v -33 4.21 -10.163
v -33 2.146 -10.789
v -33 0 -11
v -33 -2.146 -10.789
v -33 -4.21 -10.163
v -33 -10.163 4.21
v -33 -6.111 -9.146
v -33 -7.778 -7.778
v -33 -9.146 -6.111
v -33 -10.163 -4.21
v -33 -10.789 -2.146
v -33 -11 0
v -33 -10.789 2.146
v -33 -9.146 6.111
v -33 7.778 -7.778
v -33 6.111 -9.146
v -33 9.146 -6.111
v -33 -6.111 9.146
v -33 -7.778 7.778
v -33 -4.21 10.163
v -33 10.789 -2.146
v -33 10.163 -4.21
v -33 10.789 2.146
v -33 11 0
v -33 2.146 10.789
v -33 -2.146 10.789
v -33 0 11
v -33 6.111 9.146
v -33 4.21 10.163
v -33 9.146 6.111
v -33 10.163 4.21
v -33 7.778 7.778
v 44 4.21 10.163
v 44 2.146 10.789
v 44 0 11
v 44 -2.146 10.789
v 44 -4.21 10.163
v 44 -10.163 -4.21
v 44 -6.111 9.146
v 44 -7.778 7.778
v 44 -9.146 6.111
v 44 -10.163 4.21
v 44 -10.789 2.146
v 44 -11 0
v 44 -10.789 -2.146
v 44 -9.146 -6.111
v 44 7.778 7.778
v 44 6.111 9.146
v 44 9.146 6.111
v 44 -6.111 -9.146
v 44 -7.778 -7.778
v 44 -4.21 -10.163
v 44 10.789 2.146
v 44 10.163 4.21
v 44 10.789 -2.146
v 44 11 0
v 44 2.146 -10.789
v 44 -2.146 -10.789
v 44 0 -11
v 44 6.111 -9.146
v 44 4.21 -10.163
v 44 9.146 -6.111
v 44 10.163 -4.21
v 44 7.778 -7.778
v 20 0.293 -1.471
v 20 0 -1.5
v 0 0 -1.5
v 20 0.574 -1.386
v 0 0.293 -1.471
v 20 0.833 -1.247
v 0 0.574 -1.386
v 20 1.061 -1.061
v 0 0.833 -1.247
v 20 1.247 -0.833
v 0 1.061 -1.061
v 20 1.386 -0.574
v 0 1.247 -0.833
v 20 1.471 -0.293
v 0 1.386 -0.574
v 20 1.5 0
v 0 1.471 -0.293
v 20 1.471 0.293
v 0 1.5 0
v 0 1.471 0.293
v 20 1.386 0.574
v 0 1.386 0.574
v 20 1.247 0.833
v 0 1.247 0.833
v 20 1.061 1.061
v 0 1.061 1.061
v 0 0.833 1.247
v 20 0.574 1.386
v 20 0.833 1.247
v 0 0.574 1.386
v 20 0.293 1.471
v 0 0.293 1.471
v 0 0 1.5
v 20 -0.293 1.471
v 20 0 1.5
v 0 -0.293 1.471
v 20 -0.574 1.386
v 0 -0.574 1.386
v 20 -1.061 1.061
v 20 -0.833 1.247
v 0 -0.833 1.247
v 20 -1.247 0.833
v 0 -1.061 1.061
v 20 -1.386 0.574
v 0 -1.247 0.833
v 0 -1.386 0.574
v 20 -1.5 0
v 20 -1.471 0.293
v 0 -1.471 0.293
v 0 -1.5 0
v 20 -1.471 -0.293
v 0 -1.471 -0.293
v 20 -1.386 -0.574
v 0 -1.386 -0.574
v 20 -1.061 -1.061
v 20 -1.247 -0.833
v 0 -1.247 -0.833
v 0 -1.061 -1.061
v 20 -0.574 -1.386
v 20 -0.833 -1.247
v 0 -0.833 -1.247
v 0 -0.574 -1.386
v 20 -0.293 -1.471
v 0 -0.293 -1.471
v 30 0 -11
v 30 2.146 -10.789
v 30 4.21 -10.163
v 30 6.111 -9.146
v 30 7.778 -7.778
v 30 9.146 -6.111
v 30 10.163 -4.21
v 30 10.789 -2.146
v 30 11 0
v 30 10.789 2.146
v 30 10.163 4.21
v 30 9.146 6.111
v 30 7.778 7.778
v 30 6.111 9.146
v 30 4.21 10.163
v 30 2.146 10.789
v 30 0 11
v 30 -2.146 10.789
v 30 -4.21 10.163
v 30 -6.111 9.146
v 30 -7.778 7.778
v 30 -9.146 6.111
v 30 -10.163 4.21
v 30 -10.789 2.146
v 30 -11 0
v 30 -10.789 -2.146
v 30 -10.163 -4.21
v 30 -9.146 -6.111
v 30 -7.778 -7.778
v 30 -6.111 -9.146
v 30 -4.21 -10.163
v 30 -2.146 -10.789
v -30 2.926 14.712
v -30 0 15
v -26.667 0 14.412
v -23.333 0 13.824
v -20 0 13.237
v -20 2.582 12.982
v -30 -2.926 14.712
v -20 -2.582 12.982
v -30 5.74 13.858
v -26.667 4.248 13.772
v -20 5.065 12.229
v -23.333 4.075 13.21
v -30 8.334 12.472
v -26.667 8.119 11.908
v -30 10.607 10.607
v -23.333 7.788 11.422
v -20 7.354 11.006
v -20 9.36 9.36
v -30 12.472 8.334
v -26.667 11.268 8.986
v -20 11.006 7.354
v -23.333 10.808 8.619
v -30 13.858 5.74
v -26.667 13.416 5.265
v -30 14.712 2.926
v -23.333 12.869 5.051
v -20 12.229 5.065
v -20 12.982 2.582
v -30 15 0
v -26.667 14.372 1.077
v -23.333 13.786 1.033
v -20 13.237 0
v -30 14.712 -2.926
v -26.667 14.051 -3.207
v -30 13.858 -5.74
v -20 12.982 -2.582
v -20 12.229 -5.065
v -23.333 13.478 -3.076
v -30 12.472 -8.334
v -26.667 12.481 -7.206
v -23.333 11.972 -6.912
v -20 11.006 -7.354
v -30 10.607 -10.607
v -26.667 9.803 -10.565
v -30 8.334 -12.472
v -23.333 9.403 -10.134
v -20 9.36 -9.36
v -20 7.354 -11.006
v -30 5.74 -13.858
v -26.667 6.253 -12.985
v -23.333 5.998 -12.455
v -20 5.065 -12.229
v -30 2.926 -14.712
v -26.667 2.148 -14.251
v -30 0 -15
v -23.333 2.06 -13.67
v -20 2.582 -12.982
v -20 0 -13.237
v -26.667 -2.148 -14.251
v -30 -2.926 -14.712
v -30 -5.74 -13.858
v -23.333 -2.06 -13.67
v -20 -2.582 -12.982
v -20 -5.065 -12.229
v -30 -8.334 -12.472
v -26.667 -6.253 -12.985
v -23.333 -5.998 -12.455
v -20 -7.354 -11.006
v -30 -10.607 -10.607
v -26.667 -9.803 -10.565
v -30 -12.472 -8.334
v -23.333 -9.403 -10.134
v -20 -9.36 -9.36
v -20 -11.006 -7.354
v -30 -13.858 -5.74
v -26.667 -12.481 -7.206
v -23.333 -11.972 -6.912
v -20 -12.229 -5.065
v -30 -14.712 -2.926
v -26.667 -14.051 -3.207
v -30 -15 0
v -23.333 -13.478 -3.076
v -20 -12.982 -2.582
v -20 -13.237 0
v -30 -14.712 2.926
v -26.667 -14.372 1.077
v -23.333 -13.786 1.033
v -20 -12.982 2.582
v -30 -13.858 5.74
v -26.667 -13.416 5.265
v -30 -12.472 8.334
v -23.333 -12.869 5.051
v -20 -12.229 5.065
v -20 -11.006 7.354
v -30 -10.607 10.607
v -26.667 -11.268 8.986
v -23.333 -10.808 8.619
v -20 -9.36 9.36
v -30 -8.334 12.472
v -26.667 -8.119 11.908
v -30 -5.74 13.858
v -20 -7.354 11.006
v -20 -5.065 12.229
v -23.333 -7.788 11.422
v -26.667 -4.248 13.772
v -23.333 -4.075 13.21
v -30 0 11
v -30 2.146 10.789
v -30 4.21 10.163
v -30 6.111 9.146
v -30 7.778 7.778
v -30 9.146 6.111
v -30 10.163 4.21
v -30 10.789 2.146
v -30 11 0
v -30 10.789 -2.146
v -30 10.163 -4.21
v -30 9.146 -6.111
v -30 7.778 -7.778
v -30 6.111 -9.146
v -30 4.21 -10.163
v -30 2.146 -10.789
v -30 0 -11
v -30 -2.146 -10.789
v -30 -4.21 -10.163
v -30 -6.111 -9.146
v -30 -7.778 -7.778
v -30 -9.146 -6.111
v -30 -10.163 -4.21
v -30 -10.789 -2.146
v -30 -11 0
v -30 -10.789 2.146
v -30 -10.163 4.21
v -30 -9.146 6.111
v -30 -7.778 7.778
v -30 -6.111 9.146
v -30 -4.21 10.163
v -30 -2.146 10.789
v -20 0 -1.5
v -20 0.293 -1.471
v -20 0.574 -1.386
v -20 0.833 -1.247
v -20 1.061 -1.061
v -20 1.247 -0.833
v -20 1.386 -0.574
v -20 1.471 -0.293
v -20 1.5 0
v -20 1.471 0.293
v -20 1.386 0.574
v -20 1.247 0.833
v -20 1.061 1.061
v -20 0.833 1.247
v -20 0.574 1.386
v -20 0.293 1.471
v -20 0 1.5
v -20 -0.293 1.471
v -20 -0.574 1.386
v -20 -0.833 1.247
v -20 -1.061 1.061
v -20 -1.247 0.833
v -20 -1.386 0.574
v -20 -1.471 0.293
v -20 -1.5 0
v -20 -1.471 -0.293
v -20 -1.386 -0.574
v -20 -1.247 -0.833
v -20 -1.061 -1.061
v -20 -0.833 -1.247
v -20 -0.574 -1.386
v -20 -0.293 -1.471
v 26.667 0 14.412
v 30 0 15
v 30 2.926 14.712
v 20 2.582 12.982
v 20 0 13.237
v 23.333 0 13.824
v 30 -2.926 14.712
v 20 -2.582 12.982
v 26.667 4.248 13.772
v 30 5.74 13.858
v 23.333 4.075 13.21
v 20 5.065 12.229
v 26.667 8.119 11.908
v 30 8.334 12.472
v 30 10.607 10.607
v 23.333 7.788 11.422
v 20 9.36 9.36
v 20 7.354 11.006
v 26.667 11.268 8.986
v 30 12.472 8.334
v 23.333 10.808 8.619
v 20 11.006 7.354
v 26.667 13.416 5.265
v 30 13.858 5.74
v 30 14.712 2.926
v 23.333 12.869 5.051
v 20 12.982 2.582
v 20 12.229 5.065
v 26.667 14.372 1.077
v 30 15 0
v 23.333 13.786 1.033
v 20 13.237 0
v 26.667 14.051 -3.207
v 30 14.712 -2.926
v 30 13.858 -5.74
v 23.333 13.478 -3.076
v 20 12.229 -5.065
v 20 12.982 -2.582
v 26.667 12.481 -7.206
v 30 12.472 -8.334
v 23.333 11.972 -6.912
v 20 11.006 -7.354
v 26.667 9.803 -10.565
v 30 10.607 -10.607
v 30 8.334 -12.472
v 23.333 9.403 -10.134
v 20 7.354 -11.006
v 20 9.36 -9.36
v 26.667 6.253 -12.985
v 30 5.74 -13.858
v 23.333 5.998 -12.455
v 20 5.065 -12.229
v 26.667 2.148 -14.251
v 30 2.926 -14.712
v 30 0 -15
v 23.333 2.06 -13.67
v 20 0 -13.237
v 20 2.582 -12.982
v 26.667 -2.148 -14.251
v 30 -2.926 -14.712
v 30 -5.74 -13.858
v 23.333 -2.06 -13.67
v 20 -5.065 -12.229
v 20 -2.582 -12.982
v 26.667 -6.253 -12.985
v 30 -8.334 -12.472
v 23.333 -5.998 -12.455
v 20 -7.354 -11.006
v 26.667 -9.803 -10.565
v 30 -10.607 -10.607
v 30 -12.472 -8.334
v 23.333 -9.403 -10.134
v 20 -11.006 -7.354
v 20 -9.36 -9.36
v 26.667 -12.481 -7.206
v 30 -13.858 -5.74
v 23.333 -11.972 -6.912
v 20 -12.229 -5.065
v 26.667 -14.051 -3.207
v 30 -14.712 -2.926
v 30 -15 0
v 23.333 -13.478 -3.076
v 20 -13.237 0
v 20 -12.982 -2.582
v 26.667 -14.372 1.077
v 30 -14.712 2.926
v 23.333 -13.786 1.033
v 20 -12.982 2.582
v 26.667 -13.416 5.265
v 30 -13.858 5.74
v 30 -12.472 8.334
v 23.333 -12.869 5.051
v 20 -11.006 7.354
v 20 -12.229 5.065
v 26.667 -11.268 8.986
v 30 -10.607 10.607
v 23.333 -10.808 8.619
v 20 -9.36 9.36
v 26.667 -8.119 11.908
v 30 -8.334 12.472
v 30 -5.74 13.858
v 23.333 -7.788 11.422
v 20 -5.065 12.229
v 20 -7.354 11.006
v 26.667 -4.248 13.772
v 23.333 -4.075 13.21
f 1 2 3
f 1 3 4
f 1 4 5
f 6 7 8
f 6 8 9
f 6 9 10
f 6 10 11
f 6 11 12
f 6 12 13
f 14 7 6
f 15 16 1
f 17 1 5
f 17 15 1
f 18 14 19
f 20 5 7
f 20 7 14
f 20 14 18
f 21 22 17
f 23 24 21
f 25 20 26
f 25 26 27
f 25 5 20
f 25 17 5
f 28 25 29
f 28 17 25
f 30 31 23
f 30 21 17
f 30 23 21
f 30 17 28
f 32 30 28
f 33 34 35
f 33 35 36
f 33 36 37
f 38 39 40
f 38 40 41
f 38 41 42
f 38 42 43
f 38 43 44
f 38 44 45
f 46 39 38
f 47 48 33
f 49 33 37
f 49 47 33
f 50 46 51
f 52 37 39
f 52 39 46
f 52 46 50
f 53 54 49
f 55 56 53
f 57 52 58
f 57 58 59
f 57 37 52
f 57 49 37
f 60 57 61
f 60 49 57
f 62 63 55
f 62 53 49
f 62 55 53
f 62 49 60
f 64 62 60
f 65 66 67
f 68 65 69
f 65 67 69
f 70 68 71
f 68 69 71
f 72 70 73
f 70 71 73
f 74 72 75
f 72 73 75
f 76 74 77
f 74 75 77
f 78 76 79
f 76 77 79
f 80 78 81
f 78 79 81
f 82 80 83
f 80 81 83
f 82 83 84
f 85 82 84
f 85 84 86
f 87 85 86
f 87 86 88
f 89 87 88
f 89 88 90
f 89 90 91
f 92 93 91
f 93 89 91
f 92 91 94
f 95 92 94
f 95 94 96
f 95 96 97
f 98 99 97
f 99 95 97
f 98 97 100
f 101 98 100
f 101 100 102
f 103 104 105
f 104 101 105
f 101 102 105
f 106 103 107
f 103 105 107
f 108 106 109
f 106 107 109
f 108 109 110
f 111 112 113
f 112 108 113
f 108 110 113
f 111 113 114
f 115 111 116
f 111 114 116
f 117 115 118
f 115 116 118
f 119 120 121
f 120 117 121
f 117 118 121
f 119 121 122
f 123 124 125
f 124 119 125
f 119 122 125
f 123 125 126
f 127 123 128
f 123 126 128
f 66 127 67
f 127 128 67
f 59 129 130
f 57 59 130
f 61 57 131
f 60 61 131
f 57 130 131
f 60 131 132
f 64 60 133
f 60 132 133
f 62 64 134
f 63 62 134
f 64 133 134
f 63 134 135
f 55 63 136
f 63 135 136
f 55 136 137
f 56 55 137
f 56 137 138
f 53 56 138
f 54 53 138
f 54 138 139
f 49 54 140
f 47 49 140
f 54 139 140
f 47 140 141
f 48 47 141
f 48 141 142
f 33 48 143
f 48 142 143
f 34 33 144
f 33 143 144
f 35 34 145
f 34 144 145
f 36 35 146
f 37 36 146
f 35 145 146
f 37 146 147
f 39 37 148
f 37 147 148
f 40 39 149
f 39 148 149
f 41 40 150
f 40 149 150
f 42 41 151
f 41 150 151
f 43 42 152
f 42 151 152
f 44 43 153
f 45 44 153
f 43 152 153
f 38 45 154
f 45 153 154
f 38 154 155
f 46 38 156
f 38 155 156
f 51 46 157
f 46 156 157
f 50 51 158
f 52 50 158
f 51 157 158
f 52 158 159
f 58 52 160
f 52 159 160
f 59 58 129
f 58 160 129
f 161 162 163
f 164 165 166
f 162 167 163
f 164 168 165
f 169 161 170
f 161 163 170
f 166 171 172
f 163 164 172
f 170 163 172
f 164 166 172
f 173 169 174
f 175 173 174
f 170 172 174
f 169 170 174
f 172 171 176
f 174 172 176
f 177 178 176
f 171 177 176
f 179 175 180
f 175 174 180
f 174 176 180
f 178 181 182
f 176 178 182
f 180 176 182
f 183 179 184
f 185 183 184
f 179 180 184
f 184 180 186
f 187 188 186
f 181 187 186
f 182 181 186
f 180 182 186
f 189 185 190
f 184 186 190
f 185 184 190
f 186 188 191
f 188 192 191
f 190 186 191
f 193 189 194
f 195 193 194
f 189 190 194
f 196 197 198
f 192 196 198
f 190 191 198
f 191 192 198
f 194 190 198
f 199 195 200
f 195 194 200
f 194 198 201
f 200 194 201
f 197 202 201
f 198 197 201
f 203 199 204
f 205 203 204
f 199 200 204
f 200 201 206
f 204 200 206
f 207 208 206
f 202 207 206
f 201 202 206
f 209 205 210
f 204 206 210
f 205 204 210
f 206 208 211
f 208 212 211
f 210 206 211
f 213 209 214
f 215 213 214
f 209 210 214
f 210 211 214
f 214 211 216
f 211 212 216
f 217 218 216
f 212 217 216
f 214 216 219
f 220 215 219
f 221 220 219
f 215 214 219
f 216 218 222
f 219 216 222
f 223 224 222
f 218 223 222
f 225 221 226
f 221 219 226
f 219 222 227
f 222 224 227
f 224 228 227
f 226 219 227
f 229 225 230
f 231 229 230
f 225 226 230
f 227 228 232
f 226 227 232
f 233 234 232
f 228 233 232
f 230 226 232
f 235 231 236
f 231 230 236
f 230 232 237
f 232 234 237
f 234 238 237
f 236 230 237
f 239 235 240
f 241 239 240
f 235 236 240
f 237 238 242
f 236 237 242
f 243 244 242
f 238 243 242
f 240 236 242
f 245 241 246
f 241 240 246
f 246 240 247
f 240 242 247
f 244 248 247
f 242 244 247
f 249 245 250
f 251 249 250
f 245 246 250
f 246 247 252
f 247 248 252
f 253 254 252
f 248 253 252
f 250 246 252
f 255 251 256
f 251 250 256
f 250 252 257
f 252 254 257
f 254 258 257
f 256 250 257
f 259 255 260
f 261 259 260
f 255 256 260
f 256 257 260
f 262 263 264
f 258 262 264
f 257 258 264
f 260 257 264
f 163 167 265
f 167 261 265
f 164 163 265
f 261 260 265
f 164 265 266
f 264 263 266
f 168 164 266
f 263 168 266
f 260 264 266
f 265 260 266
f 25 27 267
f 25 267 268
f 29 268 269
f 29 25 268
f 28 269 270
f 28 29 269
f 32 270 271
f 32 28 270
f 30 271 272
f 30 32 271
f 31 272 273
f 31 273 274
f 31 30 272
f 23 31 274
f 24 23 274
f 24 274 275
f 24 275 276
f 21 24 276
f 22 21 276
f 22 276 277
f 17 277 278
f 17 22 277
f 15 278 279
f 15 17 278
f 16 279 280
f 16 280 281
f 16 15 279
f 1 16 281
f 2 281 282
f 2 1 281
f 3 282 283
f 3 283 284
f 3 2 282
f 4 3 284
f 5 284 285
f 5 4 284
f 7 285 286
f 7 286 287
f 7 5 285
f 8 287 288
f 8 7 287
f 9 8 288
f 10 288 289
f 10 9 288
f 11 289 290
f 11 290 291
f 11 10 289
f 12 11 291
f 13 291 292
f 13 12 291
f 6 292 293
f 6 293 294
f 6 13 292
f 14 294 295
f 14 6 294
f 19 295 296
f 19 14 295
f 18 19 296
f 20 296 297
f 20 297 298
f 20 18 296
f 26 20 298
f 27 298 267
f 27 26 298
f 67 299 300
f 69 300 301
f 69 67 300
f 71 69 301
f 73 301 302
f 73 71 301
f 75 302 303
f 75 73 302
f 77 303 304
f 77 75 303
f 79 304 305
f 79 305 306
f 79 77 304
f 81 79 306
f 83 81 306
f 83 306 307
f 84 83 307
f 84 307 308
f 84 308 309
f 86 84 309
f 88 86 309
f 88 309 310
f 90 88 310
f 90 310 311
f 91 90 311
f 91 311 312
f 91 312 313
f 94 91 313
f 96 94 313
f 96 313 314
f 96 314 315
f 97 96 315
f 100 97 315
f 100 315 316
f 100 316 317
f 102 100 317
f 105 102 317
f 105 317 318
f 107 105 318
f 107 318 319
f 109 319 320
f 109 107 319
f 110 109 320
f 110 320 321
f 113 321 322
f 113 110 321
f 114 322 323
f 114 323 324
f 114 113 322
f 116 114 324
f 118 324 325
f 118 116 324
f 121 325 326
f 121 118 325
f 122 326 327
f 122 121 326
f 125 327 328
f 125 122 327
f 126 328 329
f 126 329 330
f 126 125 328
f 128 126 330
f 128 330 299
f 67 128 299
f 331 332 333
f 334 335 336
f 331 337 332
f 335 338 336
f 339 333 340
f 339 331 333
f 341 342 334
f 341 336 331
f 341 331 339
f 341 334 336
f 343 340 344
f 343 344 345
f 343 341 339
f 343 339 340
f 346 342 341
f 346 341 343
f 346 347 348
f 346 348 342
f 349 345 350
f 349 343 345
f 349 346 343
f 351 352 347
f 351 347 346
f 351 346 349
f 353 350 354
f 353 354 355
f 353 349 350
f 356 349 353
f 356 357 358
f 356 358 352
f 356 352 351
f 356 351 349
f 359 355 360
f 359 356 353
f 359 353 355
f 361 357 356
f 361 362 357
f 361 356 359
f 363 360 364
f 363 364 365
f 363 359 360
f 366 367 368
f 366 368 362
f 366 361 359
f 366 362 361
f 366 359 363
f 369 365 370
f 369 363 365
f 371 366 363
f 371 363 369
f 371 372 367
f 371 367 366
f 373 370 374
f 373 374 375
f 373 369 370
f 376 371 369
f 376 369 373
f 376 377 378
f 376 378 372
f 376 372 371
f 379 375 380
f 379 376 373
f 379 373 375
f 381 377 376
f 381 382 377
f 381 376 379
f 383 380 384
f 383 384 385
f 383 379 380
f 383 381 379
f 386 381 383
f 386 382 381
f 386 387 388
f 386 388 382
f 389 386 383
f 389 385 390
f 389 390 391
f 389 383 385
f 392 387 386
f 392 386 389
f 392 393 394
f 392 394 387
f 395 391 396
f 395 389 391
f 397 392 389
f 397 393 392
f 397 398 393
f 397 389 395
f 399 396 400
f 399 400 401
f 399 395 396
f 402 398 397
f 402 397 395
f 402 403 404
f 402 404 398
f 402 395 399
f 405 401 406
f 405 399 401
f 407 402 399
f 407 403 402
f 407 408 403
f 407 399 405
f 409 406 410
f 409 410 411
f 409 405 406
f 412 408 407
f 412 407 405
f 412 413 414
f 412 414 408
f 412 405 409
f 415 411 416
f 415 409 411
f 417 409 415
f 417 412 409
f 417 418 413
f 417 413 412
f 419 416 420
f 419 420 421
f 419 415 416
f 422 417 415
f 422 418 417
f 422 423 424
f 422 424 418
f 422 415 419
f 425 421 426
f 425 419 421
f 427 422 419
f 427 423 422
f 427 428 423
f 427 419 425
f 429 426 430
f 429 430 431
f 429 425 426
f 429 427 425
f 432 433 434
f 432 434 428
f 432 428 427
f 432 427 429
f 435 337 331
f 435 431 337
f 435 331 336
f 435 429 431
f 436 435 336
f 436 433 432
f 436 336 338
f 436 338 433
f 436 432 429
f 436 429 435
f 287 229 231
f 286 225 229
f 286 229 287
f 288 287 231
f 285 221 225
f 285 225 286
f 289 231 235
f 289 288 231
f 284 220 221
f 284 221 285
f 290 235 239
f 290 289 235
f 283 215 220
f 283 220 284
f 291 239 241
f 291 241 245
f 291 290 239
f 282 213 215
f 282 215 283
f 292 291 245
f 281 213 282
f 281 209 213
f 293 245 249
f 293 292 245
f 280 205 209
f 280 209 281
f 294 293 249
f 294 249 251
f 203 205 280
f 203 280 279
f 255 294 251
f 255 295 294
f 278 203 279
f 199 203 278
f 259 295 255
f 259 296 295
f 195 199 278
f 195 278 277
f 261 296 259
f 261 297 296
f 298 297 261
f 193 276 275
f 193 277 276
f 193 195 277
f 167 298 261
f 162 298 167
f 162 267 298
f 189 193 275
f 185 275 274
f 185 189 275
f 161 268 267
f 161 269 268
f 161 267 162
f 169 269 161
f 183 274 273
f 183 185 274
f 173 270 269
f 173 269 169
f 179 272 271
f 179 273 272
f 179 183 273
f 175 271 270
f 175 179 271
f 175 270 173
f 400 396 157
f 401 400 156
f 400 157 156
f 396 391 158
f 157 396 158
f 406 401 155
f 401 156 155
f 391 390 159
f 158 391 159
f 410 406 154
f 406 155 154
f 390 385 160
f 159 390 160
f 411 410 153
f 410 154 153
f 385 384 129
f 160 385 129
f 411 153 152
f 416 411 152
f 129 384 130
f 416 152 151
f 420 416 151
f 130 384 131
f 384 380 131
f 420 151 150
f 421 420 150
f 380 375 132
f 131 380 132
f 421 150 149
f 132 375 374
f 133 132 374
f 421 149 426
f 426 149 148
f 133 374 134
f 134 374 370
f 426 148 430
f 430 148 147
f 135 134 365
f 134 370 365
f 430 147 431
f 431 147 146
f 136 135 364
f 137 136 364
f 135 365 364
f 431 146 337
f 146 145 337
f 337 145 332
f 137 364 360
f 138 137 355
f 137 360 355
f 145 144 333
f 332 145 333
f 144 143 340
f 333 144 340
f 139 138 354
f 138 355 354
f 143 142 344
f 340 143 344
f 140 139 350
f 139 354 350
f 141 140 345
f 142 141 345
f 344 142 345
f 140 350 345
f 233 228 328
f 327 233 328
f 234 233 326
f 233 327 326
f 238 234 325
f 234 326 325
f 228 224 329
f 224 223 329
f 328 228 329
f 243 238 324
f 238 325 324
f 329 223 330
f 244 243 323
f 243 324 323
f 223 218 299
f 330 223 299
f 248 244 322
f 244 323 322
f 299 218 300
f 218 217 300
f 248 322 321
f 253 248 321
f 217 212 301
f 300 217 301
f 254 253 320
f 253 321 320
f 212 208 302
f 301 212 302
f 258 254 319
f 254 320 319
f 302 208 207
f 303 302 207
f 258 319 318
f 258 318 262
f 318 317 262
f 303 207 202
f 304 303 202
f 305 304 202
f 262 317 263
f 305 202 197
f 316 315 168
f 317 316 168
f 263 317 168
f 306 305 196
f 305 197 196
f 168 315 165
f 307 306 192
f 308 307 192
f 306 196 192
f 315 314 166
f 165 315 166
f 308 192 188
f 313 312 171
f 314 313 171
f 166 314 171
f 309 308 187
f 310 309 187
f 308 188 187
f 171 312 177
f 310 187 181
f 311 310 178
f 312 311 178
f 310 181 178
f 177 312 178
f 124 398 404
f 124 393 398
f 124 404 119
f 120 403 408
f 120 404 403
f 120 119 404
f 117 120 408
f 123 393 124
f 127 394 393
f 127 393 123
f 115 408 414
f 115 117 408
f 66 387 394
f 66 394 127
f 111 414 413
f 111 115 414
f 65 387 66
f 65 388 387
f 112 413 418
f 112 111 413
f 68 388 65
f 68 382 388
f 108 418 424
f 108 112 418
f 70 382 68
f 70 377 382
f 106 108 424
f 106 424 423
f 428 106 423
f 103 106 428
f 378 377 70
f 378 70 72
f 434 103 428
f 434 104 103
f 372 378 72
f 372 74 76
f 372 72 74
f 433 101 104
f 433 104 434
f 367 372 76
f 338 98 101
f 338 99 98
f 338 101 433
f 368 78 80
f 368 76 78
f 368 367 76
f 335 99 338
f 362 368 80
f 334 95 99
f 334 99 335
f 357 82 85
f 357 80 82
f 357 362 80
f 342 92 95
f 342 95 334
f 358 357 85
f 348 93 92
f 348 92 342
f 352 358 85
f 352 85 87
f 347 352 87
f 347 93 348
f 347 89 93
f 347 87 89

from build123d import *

# Parameters (mm, degrees)
SKETCH1_R           = 1.5
BOSS_EXTRUDE1_DEPTH = 30
SKETCH2_R           = 11
BOSS_EXTRUDE2_DEPTH = 14
SKETCH4_R           = 15
BOSS_EXTRUDE4_DEPTH = 10
BOSS_EXTRUDE4_TAPER = 10
BOSS_EXTRUDE5_START = 3
SKETCH6_R           = 11
BOSS_EXTRUDE5_DEPTH = 3


with BuildPart() as part:
    # Sketch1 → Boss-Extrude1 (new body)
    with BuildSketch(Plane(origin=(0, 0, 0), x_dir=(0, 0, -1), z_dir=(1, 0, 0))):
        Circle(SKETCH1_R)
    boss_extrude1 = extrude(amount=BOSS_EXTRUDE1_DEPTH)

    # Sketch2 → Boss-Extrude2 (add)
    with BuildSketch(Plane(origin=(30, 0, 0), x_dir=(0, 0, -1), z_dir=(1, 0, 0))):
        Circle(SKETCH2_R)
    extrude(amount=BOSS_EXTRUDE2_DEPTH)

    # Sketch4 → Boss-Extrude4 (add)
    with BuildSketch(Plane.ZY.offset(-30)):
        Circle(SKETCH4_R)
    boss_extrude4 = extrude(amount=BOSS_EXTRUDE4_DEPTH, taper=BOSS_EXTRUDE4_TAPER)

    # Mirror2: Boss-Extrude1, Boss-Extrude4 across plane
    add(boss_extrude1.mirror(Plane(origin=(0, 0, 0), x_dir=(0, 0, 1), z_dir=(1, 0, 0))))
    add(boss_extrude4.mirror(Plane(origin=(0, 0, 0), x_dir=(0, 0, 1), z_dir=(1, 0, 0))))

    # Sketch6 → Boss-Extrude5 (add)
    with BuildSketch(Plane.ZY.offset(30).offset(BOSS_EXTRUDE5_START)):
        Circle(SKETCH6_R)
    extrude(amount=-BOSS_EXTRUDE5_DEPTH)


solid = part.part
